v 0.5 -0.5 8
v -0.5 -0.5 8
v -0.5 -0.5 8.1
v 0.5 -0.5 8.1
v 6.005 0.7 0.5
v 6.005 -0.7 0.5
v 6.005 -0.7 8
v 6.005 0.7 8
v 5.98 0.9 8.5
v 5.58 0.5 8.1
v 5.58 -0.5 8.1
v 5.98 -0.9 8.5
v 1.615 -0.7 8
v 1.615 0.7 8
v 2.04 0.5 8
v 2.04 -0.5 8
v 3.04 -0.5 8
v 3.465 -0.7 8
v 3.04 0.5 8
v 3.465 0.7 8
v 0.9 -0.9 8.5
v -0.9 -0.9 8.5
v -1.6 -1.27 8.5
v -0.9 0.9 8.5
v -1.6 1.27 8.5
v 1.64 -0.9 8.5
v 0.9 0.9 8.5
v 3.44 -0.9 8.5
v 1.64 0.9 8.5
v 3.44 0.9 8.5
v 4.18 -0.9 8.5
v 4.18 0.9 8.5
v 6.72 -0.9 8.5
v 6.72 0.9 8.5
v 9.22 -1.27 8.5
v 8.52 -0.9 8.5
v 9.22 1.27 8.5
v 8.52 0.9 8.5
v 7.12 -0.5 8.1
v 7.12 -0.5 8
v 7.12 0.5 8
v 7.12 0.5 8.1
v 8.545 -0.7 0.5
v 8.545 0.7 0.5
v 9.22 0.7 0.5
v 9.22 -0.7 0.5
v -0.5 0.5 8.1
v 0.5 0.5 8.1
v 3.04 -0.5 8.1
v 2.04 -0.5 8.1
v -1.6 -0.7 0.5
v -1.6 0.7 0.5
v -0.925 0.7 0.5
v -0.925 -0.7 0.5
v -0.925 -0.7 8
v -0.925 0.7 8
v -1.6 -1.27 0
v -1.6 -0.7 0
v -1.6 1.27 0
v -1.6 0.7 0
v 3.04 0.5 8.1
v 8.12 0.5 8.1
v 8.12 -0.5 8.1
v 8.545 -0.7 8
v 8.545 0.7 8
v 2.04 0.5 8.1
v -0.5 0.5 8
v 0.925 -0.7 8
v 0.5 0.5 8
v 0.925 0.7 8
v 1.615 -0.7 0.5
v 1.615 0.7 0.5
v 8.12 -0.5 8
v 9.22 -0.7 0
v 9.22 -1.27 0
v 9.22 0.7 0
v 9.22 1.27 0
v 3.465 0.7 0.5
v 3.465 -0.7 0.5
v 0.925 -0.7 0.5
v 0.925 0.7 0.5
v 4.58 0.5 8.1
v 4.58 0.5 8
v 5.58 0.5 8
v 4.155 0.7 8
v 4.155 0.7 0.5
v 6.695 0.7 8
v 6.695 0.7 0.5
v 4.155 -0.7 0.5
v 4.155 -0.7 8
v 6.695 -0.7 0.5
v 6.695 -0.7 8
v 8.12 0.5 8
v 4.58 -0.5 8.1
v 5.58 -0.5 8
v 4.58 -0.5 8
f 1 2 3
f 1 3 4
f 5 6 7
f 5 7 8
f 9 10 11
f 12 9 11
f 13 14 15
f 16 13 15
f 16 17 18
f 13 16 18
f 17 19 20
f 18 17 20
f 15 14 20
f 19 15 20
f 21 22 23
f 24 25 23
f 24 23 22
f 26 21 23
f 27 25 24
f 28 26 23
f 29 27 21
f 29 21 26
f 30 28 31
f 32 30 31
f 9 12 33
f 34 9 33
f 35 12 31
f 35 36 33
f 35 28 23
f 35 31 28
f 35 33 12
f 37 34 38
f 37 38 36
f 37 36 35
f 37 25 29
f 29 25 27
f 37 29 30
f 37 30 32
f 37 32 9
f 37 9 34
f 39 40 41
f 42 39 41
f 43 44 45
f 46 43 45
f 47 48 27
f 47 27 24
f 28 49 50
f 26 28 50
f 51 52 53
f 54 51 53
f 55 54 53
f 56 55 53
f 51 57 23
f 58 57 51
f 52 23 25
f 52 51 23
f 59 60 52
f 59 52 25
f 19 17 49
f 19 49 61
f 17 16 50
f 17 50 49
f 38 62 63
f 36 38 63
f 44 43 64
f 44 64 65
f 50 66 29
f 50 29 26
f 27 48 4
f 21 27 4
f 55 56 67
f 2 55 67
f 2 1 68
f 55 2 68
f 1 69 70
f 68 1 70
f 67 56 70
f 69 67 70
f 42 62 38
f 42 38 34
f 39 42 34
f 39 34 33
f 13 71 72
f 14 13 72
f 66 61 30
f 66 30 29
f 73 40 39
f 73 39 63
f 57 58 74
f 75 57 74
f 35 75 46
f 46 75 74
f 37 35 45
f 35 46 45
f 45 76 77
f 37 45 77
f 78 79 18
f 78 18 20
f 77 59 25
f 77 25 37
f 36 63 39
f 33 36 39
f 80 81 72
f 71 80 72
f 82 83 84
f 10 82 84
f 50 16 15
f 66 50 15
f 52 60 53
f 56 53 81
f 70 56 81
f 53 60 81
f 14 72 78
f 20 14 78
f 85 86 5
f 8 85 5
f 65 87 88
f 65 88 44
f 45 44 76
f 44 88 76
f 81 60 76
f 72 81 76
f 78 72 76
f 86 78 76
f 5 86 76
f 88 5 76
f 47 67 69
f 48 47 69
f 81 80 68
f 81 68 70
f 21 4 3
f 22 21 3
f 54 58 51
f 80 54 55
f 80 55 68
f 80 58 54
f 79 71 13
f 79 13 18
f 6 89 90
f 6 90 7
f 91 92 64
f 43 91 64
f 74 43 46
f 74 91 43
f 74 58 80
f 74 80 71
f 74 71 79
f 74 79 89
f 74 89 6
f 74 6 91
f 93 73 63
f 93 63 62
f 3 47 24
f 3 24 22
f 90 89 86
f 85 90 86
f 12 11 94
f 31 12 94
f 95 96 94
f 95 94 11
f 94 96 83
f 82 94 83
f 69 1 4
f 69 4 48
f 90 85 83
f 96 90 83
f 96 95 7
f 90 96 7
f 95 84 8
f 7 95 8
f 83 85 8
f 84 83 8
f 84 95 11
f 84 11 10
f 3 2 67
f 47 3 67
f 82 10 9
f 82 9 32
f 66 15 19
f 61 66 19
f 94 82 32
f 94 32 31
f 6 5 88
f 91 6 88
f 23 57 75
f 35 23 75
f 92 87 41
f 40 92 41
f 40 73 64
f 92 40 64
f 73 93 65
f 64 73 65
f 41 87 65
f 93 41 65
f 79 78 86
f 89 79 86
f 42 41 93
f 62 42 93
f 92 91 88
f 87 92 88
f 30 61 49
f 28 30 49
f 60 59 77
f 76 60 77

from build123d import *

# Parameters (mm, degrees)
SKETCH002_W      = 1
SKETCH002_H      = 1
EXTRUDE002_DEPTH = 9
SKETCH003_W      = 4
SKETCH003_H      = 1.4
EXTRUDE003_DEPTH = 0.5
SKETCH001_W      = 1.85
SKETCH001_H      = 1.4
EXTRUDE001_DEPTH = 8
SKETCH_W         = 3.2
SKETCH_H         = 2.54
EXTRUDE_DEPTH    = 8.5
CHAMFER_SIZE     = 0.4
ARRAY001_X_COUNT = 4
ARRAY001_X_PITCH = 2.54


with BuildPart() as extrude002:
    # Sketch002 → Extrude002 (new body)
    with BuildSketch(Plane.XY):
        Rectangle(SKETCH002_W, SKETCH002_H)
    extrude(amount=EXTRUDE002_DEPTH)


with BuildPart() as extrude003:
    # Sketch003 → Extrude003 (new body)
    with BuildSketch(Plane.XY):
        Rectangle(SKETCH003_W, SKETCH003_H)
    extrude(amount=EXTRUDE003_DEPTH)


with BuildPart() as fusion:
    # Sketch001 → Extrude001 (new body)
    with BuildSketch(Plane.XY):
        Rectangle(SKETCH001_W, SKETCH001_H)
    extrude(amount=EXTRUDE001_DEPTH)

    # Fusion: union Extrude002, Extrude003
    add(extrude002.part)
    add(extrude003.part)


with BuildPart() as body:
    # Sketch → Extrude (new body)
    with BuildSketch(Plane.XY):
        Rectangle(SKETCH_W, SKETCH_H)
    extrude(amount=EXTRUDE_DEPTH)

    # Cut001: cut Fusion
    add(fusion.part, mode=Mode.SUBTRACT)

    # Chamfer
    chamfer_edges = [body.edges().sort_by_distance(p)[0] for p in [
        (0.5, 0, 8.5),
        (0, 0.5, 8.5),
        (-0.5, 0, 8.5),
        (0, -0.5, 8.5),
    ]]
    chamfer(chamfer_edges, length=CHAMFER_SIZE)

    # Array001 X: body ×4


with BuildPart() as body_1:
    add(body.part)
    with Locations(*[(i * ARRAY001_X_PITCH, 0, 0) for i in range(1, ARRAY001_X_COUNT)]):
        add(body.part)


solid = body_1.part
